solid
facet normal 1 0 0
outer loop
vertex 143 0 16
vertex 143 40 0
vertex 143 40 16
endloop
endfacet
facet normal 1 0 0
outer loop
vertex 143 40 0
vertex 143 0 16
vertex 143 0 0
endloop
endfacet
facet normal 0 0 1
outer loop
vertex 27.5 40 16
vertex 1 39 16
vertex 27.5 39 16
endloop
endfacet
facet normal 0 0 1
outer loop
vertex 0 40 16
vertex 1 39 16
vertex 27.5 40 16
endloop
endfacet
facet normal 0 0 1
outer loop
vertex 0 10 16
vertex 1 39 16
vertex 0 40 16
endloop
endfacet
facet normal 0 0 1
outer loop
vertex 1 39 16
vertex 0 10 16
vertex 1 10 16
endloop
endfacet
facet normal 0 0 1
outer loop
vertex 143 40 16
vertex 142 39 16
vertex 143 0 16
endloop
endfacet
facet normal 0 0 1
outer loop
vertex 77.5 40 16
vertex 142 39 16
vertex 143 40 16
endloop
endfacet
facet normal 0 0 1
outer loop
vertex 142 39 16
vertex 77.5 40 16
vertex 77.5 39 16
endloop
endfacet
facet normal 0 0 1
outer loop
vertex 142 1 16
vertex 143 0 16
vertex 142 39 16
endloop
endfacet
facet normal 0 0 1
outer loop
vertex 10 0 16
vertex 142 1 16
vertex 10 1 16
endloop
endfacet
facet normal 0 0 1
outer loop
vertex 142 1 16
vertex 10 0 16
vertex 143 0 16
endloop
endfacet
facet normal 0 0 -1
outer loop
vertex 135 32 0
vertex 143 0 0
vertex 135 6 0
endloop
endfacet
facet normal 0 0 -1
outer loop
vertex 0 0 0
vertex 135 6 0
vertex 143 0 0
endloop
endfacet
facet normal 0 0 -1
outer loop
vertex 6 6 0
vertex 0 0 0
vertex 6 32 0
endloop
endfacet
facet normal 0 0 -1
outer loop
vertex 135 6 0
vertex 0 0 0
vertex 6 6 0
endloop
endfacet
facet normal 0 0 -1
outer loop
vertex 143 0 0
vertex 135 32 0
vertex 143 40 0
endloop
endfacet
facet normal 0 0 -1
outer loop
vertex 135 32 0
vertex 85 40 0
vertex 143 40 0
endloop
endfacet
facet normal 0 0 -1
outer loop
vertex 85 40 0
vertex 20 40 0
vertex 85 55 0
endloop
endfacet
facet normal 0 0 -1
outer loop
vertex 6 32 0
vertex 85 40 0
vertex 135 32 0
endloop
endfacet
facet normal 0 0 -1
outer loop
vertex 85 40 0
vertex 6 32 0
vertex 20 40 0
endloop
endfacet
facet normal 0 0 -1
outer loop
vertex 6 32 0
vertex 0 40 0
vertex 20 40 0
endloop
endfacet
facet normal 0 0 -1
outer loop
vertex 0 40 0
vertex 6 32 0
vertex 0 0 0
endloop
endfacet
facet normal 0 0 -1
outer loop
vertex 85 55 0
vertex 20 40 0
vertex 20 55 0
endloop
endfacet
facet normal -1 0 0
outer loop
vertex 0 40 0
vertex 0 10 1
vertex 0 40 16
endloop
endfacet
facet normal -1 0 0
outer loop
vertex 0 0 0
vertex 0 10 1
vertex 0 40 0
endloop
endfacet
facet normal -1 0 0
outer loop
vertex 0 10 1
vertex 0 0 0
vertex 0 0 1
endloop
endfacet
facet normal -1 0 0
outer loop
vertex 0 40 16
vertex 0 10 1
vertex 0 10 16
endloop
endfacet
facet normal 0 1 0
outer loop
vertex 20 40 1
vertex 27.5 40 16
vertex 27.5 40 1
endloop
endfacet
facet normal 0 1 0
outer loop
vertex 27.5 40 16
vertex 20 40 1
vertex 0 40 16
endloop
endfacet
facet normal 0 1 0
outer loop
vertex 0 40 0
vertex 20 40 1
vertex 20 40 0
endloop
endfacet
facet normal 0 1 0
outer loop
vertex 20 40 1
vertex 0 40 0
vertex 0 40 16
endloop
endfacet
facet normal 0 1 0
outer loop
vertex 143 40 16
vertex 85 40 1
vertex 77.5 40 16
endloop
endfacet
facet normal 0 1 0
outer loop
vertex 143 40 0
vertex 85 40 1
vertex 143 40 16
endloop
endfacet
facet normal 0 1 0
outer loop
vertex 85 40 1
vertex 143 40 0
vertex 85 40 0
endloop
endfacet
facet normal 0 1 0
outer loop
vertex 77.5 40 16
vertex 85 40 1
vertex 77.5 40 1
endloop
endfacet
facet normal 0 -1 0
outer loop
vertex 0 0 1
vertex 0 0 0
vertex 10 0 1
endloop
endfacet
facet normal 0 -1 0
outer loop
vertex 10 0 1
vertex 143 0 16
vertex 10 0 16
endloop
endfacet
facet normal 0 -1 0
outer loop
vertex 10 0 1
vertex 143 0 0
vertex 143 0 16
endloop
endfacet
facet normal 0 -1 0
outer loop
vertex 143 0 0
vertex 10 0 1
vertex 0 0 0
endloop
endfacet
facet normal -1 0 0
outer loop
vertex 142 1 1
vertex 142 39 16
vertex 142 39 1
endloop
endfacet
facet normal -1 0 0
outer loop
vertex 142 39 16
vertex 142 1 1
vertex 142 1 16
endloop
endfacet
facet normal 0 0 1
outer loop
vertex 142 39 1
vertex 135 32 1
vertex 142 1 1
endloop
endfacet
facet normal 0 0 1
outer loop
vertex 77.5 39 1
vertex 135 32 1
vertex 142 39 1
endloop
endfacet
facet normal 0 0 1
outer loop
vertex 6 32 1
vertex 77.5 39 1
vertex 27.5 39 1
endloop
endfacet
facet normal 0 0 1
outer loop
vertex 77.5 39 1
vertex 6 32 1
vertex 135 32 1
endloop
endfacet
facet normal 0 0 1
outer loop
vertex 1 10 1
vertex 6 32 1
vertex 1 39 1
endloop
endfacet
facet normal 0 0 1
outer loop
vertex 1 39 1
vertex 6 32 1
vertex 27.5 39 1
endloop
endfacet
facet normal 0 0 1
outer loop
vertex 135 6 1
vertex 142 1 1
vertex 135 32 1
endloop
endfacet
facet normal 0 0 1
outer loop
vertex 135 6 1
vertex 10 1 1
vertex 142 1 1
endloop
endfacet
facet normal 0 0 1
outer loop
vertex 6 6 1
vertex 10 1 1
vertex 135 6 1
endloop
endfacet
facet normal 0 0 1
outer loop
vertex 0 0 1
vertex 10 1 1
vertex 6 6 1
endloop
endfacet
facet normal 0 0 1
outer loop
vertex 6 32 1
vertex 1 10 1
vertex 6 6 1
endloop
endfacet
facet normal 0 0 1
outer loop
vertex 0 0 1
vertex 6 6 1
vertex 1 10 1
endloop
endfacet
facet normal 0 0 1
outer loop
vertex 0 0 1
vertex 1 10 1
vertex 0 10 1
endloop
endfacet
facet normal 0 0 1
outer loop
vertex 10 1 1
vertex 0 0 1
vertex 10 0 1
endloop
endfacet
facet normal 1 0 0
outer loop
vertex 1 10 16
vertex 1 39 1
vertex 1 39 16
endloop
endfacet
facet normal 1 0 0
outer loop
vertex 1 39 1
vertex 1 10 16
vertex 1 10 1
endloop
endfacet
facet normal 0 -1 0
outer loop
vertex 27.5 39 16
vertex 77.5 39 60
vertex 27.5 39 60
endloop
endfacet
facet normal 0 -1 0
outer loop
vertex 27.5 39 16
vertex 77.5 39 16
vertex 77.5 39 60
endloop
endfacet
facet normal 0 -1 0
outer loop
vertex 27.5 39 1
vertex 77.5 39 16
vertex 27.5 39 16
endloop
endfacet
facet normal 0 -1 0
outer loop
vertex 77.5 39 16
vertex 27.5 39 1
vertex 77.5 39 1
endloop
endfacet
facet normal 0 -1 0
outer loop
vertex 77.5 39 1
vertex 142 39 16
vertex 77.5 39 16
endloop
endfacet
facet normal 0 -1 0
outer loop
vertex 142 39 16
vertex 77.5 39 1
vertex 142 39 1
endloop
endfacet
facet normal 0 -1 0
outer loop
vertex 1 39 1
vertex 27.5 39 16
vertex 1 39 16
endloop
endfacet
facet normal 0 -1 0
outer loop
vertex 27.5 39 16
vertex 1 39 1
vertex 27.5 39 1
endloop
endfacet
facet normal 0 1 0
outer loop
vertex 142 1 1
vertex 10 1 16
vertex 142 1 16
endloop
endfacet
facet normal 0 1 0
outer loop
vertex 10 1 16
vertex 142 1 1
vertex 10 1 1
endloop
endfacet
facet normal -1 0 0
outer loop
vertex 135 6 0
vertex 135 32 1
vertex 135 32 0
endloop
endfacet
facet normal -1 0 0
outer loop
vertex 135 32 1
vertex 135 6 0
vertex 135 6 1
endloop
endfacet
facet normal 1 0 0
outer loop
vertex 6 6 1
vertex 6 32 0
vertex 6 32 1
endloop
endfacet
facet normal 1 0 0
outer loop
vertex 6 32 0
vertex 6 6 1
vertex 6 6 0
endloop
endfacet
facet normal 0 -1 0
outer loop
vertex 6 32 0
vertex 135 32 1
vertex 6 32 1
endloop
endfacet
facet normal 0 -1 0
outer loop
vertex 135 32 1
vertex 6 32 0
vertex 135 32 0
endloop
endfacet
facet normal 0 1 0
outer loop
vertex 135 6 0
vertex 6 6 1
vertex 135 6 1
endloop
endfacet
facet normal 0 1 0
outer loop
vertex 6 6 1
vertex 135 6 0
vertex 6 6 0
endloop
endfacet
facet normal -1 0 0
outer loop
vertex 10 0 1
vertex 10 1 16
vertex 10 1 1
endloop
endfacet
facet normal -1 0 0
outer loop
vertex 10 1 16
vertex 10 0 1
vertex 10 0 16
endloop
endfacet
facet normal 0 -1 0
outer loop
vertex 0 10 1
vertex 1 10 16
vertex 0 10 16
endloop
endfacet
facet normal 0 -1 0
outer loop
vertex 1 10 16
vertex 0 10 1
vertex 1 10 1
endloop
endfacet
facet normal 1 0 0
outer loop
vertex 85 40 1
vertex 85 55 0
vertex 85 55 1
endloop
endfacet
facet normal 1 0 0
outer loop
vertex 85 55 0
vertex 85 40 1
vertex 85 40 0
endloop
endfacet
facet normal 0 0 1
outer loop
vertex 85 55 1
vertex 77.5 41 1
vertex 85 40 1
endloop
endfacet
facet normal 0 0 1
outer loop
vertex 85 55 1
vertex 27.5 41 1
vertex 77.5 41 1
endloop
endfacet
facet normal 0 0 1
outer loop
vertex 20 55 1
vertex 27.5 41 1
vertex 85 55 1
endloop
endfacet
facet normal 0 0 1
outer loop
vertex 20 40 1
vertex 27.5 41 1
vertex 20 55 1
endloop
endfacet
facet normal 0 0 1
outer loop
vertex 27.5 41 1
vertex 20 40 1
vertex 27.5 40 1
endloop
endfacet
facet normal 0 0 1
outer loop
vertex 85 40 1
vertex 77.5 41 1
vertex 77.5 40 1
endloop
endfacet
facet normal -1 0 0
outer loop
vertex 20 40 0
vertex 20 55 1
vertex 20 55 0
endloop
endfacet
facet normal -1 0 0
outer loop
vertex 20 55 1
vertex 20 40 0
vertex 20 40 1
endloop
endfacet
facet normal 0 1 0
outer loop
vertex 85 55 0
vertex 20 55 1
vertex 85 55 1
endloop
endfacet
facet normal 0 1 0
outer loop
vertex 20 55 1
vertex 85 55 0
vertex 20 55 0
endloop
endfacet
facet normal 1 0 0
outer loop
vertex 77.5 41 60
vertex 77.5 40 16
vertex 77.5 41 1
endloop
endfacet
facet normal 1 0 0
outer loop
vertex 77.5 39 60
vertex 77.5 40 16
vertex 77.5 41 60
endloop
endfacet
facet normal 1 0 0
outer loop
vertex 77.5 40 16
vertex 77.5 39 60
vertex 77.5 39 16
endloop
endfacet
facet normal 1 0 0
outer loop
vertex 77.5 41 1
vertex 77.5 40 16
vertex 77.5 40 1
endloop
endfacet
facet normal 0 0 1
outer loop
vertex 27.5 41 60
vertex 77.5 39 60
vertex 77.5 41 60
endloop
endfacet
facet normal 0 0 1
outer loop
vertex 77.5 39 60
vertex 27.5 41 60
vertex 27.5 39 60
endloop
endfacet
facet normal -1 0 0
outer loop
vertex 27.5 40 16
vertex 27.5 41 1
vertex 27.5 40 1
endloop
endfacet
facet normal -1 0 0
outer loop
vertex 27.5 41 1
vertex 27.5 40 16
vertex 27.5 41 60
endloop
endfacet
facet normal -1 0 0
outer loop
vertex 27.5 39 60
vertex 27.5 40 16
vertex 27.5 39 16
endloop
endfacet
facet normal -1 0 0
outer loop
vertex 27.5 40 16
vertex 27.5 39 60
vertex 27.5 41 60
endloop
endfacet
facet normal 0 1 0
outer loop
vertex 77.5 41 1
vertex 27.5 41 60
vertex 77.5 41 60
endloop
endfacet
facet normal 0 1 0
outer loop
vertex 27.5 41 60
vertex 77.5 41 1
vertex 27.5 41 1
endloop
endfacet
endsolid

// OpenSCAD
difference(){
cube([143,40,16]);
translate([1,1,1])
cube([141,38,21]);
    
translate([6,6,-1])
cube([129,26,21]);
translate([-1,-1,1])
cube([11,11,40]);
}

translate([20,40,0])
cube([65,15,1]);

translate([27.5,39,0])
cube([50,2,60]);
